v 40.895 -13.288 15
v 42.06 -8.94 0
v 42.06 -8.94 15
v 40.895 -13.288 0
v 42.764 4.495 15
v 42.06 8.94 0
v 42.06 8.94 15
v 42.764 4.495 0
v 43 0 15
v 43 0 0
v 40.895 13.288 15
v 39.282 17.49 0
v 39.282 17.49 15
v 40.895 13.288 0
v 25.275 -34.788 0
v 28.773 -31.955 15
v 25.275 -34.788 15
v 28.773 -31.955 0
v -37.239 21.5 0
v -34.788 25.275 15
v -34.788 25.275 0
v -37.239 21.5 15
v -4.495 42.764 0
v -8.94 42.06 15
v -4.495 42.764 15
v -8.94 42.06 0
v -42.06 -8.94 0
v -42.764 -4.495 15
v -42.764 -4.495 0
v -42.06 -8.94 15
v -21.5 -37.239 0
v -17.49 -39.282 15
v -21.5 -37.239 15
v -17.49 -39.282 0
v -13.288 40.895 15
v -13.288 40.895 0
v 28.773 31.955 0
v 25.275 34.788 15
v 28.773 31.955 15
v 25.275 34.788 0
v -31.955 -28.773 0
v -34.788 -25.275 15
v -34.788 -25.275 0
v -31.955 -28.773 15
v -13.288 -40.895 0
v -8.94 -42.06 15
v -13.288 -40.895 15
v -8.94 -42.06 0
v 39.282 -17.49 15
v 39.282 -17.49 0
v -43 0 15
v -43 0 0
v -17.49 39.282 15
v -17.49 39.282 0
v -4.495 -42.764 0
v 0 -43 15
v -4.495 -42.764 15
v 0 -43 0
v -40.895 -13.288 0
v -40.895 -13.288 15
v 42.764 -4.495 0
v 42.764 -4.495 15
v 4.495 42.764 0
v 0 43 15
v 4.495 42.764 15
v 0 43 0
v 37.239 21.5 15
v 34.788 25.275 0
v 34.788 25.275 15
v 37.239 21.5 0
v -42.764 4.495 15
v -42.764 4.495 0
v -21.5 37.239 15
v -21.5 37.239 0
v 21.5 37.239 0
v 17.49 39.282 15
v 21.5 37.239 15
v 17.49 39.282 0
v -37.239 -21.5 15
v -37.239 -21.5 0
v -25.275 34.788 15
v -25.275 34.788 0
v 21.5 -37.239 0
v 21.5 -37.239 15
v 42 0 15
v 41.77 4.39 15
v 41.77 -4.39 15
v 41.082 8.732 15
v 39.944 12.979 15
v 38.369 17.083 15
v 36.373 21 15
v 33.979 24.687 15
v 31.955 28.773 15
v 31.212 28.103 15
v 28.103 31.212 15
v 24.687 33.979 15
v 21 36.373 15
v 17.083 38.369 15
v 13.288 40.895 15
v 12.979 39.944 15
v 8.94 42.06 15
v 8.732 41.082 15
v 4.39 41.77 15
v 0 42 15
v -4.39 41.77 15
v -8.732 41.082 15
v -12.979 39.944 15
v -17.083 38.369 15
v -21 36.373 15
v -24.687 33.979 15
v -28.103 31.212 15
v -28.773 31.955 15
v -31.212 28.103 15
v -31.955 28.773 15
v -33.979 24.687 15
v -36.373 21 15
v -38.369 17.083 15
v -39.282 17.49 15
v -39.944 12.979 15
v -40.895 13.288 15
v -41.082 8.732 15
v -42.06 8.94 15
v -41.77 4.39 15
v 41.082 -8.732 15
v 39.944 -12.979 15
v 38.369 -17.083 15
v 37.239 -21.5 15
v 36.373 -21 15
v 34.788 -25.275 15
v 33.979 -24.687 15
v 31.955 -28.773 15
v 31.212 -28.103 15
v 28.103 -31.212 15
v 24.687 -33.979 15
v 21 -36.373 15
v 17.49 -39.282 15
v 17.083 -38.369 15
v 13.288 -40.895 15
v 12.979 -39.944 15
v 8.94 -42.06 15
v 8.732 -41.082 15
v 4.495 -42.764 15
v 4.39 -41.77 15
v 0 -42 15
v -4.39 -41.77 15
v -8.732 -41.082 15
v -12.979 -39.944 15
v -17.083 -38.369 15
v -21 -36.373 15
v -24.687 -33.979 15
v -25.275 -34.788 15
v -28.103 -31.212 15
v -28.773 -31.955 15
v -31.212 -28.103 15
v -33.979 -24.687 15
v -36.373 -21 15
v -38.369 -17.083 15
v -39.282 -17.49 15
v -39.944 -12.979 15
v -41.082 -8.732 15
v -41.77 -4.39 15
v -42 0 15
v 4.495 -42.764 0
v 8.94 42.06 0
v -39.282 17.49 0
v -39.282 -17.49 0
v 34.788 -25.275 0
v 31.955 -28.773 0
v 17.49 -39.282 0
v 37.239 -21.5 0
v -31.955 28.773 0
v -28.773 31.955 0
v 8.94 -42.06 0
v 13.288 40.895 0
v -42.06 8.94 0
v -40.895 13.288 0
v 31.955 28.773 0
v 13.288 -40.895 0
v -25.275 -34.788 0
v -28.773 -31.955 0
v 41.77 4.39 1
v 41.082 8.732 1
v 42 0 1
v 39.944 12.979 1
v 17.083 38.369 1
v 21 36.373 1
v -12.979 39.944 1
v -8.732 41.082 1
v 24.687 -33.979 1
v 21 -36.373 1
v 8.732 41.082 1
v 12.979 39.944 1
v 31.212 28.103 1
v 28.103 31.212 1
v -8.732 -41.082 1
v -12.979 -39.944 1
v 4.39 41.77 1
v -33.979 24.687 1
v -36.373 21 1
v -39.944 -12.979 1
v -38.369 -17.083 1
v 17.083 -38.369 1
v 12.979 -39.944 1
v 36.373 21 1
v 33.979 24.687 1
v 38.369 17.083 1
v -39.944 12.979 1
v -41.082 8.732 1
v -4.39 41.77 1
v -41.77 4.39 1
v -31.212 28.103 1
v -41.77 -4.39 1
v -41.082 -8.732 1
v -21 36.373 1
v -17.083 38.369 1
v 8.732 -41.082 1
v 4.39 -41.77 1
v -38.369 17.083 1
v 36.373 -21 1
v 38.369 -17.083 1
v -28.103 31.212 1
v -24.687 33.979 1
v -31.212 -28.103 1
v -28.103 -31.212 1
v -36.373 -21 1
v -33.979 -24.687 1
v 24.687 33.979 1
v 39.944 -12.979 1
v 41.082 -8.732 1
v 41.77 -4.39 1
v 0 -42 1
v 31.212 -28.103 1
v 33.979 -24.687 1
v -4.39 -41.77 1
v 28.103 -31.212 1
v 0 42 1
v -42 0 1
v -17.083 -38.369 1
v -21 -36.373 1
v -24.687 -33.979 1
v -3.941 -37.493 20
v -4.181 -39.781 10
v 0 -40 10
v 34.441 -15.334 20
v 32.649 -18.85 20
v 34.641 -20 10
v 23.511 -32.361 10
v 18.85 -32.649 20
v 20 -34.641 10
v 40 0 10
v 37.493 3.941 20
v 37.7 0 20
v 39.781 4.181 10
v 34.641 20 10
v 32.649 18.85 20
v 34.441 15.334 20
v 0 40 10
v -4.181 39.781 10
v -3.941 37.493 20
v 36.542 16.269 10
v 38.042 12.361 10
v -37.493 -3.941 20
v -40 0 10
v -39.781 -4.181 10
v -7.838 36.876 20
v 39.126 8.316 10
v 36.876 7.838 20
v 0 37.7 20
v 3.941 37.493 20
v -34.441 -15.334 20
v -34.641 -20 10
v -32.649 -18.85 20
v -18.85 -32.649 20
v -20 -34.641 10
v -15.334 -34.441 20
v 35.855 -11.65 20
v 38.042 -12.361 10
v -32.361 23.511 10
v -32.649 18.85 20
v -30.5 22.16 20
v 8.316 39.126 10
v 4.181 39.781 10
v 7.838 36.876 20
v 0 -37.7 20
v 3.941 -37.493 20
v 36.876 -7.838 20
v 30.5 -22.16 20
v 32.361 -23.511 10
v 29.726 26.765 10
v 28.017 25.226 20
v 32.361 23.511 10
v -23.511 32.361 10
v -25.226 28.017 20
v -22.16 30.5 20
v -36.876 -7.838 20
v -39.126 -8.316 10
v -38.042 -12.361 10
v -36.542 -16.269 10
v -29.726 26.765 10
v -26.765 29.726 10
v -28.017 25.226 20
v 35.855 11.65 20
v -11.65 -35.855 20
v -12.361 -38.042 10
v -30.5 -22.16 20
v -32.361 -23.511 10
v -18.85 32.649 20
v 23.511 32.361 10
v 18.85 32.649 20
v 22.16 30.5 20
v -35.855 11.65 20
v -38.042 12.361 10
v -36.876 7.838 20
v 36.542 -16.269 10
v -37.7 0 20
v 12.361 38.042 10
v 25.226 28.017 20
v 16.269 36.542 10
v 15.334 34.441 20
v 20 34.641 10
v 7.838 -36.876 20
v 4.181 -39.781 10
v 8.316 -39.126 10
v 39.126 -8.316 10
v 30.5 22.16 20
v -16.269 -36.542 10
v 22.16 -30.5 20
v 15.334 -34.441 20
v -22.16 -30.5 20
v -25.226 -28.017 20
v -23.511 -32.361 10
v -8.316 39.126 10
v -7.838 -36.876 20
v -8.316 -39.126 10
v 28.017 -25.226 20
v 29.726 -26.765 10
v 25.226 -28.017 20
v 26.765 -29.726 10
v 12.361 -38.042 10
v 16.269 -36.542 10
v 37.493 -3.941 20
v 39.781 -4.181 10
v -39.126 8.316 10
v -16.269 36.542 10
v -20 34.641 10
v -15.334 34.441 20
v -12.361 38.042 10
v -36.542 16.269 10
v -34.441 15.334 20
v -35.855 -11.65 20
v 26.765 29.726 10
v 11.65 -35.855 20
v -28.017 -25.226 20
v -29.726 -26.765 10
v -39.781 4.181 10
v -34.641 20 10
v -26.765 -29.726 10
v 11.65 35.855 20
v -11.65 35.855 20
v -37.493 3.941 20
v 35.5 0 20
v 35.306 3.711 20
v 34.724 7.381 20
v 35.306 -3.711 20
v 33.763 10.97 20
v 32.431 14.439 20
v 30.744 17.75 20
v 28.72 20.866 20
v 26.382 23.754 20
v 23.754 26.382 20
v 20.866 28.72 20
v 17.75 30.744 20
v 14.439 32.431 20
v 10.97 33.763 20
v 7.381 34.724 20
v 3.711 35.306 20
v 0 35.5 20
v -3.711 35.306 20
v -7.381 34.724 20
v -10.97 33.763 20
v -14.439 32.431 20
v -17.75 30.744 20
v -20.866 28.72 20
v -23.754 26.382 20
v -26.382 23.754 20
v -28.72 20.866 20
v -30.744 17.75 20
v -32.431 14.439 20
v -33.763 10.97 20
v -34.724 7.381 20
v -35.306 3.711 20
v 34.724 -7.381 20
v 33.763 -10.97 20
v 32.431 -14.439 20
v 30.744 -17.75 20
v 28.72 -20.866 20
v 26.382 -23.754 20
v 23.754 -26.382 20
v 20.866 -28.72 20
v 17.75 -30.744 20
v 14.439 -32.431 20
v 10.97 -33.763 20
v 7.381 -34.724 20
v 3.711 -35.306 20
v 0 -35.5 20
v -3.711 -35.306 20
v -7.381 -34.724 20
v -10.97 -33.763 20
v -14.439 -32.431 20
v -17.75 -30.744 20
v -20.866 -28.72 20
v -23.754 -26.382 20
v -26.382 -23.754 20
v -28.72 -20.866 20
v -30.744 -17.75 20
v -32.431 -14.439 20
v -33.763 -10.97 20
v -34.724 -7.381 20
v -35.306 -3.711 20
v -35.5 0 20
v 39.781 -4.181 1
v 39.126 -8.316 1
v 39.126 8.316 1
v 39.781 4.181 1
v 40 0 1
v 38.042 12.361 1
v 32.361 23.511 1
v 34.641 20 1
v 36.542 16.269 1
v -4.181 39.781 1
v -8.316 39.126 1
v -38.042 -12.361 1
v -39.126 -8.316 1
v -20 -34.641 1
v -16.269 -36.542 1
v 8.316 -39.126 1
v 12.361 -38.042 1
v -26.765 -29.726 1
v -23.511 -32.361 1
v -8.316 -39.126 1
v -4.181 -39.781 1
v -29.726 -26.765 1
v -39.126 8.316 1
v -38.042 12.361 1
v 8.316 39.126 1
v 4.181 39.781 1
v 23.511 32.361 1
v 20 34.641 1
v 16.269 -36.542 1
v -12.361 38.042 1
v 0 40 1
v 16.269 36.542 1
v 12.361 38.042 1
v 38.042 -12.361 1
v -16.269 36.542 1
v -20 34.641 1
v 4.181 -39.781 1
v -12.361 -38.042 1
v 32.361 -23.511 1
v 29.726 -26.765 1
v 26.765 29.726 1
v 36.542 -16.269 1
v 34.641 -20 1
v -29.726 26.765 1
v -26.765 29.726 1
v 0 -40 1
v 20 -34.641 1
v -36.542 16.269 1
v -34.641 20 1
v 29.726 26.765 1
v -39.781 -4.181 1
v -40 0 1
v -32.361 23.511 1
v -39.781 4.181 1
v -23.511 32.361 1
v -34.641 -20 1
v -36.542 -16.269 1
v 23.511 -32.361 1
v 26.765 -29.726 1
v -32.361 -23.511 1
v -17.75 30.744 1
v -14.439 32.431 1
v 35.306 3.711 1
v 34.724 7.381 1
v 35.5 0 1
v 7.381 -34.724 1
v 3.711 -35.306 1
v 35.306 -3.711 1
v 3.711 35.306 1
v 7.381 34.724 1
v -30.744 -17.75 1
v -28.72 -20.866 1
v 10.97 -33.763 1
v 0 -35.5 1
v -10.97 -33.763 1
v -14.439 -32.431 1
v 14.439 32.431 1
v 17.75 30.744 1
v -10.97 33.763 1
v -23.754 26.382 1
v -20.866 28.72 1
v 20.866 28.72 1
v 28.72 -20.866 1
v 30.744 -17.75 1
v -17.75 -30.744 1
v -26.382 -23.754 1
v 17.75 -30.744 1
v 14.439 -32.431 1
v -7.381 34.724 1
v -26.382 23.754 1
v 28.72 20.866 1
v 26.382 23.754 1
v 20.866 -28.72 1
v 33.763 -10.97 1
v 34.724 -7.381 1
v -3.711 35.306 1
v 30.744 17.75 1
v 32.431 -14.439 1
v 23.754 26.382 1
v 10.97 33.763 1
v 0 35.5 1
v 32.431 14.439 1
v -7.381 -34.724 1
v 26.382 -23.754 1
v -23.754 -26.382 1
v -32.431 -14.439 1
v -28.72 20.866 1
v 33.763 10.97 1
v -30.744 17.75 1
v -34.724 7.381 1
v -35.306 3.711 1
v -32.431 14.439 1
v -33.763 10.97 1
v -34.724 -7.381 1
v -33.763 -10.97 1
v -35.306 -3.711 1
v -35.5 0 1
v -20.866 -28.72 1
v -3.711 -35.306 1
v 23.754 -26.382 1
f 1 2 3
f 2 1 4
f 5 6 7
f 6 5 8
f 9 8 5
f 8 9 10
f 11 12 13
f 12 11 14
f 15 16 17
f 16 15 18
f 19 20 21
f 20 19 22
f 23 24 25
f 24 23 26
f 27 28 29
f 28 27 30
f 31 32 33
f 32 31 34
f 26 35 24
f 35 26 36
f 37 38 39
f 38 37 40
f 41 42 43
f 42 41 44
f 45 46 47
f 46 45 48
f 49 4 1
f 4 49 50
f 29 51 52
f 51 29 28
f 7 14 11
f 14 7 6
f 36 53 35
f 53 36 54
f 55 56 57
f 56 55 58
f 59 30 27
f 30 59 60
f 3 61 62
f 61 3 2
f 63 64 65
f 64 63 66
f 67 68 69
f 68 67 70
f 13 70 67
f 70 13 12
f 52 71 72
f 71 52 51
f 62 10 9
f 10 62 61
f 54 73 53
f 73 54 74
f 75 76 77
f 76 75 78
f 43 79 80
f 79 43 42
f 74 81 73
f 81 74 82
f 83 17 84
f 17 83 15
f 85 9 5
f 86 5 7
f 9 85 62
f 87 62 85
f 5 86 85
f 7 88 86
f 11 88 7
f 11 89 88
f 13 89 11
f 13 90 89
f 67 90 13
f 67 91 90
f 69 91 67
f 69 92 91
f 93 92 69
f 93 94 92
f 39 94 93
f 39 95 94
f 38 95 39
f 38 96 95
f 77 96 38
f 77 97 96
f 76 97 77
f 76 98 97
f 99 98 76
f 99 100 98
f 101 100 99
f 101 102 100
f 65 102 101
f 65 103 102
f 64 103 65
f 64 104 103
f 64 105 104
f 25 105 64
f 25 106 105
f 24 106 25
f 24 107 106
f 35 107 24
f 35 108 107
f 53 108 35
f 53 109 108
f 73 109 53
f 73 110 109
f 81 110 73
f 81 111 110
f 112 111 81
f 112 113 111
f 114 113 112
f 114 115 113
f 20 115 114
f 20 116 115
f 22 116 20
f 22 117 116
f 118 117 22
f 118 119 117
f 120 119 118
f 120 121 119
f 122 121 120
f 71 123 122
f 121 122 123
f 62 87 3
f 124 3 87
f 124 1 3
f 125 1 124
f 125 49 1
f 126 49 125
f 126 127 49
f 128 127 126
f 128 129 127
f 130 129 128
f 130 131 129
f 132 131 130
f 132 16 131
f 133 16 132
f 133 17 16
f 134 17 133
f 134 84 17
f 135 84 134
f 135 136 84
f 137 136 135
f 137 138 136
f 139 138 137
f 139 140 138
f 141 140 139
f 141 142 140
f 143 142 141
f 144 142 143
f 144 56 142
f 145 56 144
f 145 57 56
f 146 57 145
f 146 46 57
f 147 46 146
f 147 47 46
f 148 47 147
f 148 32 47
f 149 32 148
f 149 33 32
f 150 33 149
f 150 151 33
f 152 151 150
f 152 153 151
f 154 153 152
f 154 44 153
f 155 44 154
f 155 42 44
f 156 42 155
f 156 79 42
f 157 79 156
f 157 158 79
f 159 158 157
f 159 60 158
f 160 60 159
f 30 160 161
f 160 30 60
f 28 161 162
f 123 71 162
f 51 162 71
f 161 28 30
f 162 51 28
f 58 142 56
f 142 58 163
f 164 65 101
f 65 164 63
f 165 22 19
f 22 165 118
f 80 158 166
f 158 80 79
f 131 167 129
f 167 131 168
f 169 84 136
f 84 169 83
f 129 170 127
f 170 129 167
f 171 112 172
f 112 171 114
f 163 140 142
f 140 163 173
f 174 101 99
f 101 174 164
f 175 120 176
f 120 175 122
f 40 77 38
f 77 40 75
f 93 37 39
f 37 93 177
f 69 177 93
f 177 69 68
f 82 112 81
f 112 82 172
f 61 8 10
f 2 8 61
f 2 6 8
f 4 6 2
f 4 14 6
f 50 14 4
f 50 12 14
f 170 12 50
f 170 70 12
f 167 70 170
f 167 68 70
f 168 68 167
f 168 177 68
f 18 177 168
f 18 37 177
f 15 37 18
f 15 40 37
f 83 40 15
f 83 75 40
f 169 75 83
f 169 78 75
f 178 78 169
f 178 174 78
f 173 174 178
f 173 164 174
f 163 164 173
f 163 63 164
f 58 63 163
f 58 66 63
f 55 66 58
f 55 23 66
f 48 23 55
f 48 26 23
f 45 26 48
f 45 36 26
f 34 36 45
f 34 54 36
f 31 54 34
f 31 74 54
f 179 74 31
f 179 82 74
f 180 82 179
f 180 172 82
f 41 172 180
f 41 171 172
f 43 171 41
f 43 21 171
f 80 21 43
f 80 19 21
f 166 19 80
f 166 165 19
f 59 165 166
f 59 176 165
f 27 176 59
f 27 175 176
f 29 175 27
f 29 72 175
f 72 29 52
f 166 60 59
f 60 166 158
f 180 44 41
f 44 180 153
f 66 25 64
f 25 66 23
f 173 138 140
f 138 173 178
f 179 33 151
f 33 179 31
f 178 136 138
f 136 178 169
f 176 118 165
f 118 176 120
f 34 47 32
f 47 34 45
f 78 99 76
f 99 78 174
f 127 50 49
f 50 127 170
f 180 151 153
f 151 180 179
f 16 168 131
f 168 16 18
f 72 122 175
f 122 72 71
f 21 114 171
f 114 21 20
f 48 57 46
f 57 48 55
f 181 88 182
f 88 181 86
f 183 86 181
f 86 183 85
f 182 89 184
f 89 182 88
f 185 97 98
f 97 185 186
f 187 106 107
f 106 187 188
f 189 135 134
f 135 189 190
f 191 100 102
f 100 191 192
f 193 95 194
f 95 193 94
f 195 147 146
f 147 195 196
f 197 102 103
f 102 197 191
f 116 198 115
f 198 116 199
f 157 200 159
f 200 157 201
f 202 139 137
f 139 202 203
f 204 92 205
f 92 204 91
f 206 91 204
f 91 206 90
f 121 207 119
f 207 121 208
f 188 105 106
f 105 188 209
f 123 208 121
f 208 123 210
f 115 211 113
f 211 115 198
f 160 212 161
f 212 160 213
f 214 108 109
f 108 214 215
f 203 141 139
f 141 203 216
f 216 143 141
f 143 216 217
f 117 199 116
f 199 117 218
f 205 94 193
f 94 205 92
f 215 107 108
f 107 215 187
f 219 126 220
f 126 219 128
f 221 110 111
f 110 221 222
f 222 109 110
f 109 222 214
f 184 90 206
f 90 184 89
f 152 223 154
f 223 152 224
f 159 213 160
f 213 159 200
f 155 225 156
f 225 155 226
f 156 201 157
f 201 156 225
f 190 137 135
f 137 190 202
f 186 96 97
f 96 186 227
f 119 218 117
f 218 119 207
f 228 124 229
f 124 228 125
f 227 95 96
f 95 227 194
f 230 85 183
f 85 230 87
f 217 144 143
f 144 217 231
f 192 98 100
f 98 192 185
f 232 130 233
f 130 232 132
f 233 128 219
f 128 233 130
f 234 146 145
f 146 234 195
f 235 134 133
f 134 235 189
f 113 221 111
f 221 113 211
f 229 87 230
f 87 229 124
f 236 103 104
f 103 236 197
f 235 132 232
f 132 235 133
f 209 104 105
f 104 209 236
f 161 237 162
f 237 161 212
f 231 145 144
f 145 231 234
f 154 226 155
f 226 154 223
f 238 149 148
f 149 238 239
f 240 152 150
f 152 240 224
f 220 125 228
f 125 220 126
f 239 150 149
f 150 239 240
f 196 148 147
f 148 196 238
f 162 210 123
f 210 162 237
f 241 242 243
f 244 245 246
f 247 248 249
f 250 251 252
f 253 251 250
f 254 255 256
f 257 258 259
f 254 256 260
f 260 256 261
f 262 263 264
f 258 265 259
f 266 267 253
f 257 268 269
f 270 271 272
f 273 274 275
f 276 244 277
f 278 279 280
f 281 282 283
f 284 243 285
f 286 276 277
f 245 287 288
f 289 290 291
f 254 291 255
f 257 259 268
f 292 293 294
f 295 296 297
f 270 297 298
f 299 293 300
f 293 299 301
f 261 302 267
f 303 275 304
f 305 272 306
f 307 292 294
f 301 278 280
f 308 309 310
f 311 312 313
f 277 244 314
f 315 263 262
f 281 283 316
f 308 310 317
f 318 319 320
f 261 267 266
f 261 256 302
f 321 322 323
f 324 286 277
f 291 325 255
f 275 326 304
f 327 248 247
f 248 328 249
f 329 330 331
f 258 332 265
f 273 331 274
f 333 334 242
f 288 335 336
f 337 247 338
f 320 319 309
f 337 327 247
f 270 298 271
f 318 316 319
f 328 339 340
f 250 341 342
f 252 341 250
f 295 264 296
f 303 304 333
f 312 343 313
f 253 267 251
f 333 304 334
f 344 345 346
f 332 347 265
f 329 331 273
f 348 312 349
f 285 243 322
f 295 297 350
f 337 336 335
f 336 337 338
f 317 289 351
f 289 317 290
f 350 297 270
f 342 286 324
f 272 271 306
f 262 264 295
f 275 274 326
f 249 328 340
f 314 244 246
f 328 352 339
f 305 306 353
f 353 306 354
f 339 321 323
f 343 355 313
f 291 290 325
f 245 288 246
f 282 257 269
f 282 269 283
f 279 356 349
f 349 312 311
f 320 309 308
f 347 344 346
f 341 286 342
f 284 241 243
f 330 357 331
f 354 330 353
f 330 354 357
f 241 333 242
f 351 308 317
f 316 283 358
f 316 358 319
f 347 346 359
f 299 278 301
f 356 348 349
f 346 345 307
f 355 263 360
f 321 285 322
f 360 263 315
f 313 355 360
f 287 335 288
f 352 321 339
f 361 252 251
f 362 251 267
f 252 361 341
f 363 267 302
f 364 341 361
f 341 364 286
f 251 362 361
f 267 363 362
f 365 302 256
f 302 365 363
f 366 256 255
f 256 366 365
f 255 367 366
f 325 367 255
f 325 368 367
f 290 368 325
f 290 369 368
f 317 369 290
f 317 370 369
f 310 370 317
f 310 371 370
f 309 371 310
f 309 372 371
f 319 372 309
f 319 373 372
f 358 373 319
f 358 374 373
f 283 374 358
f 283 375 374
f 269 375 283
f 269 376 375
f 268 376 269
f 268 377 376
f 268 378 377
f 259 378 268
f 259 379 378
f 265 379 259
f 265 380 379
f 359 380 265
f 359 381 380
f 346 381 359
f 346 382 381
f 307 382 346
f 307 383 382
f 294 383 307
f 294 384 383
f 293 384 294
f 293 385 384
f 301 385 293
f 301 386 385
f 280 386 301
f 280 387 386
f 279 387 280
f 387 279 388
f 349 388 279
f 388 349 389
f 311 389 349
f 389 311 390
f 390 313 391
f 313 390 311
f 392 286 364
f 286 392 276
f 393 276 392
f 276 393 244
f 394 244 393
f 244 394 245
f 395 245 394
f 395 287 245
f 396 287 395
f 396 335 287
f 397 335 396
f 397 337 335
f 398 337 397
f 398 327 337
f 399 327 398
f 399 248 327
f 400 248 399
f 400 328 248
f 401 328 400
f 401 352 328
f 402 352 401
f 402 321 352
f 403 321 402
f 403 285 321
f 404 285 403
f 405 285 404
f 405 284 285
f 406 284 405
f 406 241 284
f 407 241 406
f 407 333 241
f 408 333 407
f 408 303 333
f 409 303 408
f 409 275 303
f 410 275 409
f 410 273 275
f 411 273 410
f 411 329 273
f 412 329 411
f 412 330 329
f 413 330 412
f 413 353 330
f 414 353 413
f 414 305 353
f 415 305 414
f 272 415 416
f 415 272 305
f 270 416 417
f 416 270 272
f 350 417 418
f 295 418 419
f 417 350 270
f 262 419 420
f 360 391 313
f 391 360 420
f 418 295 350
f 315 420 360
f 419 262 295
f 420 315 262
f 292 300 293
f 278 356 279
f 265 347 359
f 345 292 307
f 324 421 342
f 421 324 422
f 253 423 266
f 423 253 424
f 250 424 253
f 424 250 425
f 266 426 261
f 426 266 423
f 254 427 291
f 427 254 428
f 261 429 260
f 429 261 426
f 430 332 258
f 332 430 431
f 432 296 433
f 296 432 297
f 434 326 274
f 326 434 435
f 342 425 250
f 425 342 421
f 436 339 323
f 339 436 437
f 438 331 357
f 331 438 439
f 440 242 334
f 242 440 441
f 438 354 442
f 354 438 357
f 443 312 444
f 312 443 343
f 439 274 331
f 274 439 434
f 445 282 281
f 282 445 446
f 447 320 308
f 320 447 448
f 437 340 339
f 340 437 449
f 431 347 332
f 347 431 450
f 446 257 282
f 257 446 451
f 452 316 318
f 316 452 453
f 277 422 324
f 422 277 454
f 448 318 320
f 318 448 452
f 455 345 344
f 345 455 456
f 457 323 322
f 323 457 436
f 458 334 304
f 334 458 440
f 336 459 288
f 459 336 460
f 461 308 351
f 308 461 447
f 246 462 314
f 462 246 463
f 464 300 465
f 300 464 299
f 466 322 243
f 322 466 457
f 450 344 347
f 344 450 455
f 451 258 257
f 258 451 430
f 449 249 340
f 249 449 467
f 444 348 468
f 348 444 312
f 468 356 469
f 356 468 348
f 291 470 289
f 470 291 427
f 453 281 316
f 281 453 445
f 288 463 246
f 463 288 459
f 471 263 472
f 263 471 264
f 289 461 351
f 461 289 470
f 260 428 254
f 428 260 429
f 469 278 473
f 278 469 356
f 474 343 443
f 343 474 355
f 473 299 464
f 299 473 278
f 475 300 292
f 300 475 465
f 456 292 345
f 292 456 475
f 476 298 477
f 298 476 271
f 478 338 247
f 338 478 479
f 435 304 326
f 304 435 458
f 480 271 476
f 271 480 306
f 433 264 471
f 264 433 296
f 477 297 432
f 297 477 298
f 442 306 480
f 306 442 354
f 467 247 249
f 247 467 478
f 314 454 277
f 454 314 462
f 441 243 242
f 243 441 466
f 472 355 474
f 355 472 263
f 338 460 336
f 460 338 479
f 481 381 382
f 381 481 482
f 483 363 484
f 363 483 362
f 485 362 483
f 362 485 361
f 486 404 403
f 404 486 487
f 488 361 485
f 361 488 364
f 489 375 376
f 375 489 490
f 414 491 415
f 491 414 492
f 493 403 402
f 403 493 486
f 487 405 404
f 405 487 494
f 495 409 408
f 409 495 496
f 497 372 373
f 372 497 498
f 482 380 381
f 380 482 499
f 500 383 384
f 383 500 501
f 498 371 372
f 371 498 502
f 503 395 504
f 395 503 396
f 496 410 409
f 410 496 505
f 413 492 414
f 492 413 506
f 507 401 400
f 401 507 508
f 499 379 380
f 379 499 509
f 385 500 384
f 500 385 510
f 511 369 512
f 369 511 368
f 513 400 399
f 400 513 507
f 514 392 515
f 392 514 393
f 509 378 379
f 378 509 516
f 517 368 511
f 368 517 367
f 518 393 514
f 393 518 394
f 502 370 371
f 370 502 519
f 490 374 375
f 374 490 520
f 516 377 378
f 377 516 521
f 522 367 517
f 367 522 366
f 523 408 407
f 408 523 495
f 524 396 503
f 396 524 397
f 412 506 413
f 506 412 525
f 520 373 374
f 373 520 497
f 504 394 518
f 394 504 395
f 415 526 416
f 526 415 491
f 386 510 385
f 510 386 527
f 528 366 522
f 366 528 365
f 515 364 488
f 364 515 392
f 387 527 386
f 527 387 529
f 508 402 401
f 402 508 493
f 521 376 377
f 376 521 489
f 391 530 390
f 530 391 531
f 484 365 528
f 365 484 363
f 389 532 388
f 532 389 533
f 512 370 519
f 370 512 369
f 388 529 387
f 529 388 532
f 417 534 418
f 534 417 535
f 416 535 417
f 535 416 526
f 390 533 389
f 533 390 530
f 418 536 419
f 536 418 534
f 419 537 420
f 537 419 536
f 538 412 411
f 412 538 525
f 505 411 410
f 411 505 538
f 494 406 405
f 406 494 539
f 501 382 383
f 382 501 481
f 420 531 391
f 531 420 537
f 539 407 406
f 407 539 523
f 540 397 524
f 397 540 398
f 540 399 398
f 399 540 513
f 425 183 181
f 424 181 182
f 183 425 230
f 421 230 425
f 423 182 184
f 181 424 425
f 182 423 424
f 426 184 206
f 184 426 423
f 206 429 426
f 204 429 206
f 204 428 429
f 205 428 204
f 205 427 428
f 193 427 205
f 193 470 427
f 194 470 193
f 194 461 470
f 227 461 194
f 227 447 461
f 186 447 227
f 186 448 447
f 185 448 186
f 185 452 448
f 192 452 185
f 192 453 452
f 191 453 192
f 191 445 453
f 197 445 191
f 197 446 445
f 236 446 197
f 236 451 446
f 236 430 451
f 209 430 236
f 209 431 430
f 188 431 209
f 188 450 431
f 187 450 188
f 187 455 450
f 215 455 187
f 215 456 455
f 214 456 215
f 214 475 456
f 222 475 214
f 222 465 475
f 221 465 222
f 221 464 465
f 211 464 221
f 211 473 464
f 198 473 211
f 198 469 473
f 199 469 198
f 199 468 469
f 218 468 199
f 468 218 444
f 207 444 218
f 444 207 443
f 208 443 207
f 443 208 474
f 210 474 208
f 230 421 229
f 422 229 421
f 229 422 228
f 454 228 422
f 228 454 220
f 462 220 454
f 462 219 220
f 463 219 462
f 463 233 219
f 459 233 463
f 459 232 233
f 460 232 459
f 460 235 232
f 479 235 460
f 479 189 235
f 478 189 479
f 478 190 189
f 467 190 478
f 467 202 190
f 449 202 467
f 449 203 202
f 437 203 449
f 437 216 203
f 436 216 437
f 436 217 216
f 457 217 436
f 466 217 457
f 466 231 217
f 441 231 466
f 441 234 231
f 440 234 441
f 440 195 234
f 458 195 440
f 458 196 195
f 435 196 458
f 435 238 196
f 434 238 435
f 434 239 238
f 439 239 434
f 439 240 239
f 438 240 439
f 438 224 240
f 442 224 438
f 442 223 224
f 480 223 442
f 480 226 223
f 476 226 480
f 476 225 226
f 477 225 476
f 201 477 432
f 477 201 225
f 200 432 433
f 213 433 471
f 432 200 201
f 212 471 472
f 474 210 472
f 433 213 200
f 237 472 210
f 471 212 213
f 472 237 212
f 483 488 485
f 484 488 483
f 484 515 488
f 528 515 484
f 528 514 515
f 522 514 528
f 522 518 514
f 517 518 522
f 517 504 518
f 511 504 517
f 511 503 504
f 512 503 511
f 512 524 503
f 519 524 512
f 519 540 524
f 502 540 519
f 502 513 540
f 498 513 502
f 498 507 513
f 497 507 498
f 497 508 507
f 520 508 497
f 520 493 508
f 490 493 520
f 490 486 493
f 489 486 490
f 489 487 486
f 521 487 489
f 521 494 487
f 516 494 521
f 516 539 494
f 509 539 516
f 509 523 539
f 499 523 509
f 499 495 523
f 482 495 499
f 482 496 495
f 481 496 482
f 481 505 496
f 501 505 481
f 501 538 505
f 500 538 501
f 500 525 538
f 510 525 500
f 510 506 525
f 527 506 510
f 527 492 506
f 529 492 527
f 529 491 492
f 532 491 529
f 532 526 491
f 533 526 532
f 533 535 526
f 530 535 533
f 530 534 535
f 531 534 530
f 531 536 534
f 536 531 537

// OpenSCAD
$fn=60;
outer = 43;
wall=1;
slit=2;
slit_top = 2.3;
led= 35.5;

wall_h = 15;
inner_h_l = 10;
inner_h_h = 10;
base_h = 1;

piller_w = 10;
piller_d = 5;
piller_wall=1;

paper_h=210;

difference(){
cylinder(wall_h, outer, outer);
cylinder(wall_h, outer-wall, outer-wall);
}
difference(){
    union(){
        translate([0,0,inner_h_l])
        cylinder(inner_h_h, outer-wall-slit, outer-wall-slit-slit_top);
        cylinder(inner_h_l, outer-wall-slit, outer-wall-slit);
    }
cylinder(inner_h_h+inner_h_l, led, led);
}
cylinder(base_h, outer, outer);

/*
translate([outer-wall+piller_d/2,0, wall_h/2])
difference(){
cube([piller_d,piller_w,wall_h],center=true);
cube([piller_d-piller_wall,piller_w-piller_wall,wall_h],center=true);
}
*/

/*
cube([piller_d, piller_w, paper_h-(wall_h-base_h)]);
translate([piller_wall*2,piller_wall,paper_h-(wall_h-base_h)])
cube([piller_d-piller_wall*2, piller_w-piller_wall*2, (wall_h-base_h)]);
translate([piller_wall*2,piller_wall,-(wall_h-base_h)])
cube([piller_d-piller_wall*2, piller_w-piller_wall*2, (wall_h-base_h)]);
*/
